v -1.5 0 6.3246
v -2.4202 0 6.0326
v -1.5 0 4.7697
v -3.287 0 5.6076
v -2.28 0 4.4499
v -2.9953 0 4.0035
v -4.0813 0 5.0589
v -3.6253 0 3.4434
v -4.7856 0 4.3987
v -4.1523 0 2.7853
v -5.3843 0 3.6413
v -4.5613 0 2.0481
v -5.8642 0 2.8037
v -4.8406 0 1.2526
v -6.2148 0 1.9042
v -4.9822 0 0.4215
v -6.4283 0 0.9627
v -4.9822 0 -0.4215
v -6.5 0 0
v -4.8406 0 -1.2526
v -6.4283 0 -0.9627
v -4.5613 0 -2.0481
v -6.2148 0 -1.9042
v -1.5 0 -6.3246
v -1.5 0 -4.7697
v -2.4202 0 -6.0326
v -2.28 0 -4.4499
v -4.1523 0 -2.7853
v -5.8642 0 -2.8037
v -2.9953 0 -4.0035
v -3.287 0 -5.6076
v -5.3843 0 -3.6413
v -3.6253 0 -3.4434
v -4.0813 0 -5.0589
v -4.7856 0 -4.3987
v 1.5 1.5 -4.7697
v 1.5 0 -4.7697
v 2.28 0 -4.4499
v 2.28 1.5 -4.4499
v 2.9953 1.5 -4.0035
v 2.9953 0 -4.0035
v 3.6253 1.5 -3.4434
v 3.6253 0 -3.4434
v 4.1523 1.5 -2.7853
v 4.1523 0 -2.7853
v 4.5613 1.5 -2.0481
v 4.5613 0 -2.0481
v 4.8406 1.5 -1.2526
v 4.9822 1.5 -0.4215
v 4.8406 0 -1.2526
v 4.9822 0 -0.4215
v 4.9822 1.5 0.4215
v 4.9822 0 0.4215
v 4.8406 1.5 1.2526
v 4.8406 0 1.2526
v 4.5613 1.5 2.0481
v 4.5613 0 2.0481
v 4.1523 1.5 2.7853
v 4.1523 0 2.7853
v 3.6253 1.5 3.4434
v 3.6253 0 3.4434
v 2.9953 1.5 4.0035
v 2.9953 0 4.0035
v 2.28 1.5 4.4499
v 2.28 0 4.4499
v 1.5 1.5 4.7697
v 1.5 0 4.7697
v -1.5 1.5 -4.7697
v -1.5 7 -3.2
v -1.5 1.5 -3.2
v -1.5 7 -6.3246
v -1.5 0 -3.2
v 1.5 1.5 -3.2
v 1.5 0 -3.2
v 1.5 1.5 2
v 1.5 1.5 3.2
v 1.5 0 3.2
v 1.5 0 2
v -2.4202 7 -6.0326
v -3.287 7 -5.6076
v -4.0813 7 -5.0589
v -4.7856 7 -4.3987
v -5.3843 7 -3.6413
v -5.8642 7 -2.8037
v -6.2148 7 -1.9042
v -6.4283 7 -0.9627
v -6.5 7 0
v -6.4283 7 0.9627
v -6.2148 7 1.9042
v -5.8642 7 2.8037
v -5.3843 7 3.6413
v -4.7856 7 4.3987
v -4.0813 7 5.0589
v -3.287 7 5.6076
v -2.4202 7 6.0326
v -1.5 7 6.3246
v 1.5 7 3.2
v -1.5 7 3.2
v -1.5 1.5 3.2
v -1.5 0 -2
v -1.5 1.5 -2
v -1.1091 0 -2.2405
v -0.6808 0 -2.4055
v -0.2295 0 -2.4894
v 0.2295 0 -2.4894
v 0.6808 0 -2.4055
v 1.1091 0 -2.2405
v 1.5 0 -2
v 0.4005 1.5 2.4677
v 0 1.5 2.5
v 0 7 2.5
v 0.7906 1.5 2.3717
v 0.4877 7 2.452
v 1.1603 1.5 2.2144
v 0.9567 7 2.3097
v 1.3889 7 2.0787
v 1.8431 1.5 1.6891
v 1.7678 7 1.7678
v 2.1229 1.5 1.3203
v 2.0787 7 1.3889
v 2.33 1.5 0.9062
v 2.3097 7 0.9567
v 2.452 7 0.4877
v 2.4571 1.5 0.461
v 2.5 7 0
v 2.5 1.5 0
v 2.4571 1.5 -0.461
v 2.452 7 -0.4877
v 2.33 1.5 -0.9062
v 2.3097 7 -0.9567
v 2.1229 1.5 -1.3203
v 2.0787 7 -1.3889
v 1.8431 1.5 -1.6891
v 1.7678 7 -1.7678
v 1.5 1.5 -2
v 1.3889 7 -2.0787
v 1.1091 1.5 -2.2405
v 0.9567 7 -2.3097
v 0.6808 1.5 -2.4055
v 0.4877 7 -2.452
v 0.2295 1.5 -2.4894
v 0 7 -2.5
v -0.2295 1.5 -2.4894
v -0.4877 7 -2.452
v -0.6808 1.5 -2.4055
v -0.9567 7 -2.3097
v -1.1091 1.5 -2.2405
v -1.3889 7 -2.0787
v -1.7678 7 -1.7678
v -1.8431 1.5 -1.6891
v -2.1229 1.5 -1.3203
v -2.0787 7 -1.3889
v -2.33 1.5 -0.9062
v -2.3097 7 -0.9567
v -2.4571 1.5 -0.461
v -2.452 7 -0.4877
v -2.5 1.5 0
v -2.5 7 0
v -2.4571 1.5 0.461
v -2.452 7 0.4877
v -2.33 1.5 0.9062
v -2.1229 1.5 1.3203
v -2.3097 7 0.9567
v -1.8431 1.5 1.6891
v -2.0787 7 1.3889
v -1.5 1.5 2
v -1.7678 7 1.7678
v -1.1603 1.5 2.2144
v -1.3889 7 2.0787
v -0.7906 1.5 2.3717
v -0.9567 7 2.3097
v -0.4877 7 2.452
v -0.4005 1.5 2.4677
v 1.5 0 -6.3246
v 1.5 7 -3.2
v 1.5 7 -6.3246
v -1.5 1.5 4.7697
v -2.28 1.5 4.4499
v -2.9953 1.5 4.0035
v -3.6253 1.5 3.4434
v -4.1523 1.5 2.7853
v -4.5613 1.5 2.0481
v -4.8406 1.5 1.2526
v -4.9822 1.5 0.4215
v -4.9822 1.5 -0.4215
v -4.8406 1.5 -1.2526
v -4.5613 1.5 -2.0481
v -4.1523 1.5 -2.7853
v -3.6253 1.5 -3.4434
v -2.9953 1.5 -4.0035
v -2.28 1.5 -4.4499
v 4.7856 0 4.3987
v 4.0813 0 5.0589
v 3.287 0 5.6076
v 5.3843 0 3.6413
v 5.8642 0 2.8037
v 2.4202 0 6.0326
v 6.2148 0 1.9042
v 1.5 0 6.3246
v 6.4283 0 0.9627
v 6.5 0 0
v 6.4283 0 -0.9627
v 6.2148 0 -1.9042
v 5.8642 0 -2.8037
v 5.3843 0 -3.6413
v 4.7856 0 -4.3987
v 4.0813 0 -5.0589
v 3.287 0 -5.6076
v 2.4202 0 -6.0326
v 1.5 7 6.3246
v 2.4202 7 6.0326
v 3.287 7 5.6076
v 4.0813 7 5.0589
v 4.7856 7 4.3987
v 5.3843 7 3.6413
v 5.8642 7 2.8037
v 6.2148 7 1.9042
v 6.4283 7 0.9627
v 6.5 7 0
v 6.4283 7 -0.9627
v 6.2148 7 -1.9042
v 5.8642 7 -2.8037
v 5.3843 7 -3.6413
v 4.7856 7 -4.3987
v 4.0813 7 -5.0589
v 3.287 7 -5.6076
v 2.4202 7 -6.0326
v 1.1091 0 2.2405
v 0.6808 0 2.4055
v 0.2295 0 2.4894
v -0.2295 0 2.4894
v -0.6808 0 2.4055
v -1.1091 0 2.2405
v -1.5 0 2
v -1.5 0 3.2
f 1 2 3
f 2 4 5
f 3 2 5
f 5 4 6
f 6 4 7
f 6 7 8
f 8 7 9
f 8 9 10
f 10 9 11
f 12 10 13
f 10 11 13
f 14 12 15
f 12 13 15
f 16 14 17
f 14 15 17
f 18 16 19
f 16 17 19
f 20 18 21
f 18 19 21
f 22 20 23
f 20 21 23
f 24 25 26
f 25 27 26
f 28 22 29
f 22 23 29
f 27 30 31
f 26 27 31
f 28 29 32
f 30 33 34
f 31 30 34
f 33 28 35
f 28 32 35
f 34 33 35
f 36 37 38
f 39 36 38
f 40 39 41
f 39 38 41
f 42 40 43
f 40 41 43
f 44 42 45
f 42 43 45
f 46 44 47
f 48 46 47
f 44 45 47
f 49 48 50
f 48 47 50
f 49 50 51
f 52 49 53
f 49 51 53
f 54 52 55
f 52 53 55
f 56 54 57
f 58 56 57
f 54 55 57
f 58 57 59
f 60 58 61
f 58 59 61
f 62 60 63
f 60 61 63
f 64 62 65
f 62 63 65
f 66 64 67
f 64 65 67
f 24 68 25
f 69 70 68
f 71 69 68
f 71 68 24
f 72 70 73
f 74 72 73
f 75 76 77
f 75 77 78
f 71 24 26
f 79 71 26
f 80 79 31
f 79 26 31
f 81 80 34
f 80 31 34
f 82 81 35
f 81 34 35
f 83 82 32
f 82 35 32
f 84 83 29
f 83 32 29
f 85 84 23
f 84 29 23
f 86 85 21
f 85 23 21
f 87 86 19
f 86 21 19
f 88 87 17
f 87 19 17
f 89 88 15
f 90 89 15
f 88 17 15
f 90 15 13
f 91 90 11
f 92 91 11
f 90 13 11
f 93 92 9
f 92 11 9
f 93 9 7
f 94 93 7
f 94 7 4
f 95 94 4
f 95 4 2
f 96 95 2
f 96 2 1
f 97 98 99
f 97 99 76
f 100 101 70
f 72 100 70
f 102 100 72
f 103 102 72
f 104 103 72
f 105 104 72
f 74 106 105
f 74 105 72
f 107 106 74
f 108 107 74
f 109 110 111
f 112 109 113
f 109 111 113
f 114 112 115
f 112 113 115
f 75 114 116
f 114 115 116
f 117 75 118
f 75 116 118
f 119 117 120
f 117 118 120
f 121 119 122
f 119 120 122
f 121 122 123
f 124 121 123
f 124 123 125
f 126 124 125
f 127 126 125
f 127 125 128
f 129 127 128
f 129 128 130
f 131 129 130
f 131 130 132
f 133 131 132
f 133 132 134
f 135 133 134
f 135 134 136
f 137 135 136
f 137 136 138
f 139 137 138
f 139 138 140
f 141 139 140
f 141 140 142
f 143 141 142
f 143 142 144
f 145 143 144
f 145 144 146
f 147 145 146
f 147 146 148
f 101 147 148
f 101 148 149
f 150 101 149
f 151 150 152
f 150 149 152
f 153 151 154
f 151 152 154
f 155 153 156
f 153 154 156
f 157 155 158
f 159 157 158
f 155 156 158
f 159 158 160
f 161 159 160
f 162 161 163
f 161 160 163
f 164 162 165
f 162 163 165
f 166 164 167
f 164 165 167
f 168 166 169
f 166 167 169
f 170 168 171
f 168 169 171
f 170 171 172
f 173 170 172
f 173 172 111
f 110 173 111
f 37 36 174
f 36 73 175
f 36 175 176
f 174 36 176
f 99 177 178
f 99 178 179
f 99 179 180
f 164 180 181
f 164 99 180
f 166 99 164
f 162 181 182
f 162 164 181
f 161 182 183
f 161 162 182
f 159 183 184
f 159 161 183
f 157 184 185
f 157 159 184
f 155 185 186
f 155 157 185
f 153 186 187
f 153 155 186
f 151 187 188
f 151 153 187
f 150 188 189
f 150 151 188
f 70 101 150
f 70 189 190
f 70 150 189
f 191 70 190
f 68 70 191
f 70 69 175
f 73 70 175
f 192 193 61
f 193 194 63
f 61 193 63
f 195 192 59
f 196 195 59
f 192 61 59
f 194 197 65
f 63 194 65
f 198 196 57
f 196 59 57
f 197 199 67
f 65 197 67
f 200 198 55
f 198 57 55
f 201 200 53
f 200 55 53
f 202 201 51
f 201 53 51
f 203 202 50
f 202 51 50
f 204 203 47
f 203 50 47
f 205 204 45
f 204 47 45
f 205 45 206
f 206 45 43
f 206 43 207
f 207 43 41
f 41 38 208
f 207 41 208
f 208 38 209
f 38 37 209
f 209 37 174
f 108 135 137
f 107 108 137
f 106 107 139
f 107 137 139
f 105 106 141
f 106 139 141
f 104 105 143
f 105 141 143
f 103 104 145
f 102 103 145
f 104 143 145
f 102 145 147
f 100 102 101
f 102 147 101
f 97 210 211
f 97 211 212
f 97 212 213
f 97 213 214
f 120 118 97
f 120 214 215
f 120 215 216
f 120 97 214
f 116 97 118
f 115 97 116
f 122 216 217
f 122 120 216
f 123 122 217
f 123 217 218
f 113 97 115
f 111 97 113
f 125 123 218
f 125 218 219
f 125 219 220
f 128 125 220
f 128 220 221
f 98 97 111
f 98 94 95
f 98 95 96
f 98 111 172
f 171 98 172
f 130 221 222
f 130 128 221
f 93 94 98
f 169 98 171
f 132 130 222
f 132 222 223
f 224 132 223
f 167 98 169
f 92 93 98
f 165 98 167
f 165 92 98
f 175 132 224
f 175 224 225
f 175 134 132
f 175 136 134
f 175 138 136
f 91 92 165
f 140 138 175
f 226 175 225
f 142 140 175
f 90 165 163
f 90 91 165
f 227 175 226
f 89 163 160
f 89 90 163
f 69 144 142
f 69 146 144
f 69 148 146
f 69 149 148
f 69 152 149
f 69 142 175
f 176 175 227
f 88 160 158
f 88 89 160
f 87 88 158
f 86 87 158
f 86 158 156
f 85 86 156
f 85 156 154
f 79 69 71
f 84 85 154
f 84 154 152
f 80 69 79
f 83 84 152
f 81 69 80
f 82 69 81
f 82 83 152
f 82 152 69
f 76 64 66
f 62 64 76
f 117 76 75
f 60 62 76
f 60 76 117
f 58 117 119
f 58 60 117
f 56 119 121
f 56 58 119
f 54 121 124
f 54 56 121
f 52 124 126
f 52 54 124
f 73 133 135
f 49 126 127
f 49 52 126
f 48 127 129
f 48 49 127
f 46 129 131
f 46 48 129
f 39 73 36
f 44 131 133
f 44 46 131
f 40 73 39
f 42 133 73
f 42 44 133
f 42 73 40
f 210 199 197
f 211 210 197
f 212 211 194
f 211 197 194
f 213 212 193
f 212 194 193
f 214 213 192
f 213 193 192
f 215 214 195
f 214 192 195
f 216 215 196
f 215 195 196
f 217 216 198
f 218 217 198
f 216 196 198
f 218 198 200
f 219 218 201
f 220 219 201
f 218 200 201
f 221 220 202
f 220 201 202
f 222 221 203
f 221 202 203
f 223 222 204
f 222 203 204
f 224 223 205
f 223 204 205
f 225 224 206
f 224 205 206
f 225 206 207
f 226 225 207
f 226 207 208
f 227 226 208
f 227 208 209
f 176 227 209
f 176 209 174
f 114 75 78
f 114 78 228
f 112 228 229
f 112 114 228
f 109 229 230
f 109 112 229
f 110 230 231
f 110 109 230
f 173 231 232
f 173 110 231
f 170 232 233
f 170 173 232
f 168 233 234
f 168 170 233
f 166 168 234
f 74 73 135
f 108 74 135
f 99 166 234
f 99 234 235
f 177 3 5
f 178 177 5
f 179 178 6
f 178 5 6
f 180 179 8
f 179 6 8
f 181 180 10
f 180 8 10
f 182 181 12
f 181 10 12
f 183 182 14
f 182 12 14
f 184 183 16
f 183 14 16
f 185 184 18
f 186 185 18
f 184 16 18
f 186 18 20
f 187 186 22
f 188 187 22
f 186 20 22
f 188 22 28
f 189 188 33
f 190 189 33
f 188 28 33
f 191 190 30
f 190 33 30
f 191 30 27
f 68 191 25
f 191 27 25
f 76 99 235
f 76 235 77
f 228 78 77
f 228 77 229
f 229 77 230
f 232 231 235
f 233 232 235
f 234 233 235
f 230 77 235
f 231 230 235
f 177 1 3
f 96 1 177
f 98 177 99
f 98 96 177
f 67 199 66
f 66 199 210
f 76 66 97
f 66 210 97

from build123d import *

# Parameters (mm, degrees)
SKETCH1_R           = 6.5
BOSS_EXTRUDE1_DEPTH = 7
SKETCH2_R           = 5
CUT_EXTRUDE1_DEPTH  = 1.5
SKETCH3_R           = 2.5
SKETCH3_W           = 3
SKETCH3_H           = 3.5
CUT_EXTRUDE2_DEPTH  = 12.554220008
BOSS_EXTRUDE2_DEPTH = 1.5


with BuildPart() as part:
    # Sketch1 → Boss-Extrude1 (new body)
    with BuildSketch(Plane(origin=(0, 0, 0), x_dir=(1, 0, 0), z_dir=(0, 1, 0))):
        Circle(SKETCH1_R)
    extrude(amount=BOSS_EXTRUDE1_DEPTH)

    # Sketch2 → Cut-Extrude1 (cut)
    with BuildSketch(Plane.XZ):
        Circle(SKETCH2_R)
    extrude(amount=-CUT_EXTRUDE1_DEPTH, mode=Mode.SUBTRACT)

    # Sketch3 → Cut-Extrude2 (cut, through all)
    with BuildSketch(Plane(origin=(0, 7, 0), x_dir=(1, 0, 0), z_dir=(0, 1, 0))):
        Circle(SKETCH3_R)
        with Locations((0, 4.95)):
            Rectangle(SKETCH3_W, SKETCH3_H)
        with Locations((0, -4.95)):
            Rectangle(SKETCH3_W, SKETCH3_H)
    extrude(amount=-CUT_EXTRUDE2_DEPTH, mode=Mode.SUBTRACT)

    # Sketch4 → Boss-Extrude2 (add)
    with BuildSketch(Plane.XZ.offset(-1.5)):
        with BuildLine():
            Line((-1.5, 2), (-1.5, 3.2))
            Line((-1.5, 3.2), (1.5, 3.2))
            Line((1.5, 3.2), (1.5, 2))
            ThreePointArc((1.5, 2), (0, 2.5), (-1.5, 2))
        make_face()
        with BuildLine():
            Line((-1.5, -2), (-1.5, -3.2))
            Line((-1.5, -3.2), (1.5, -3.2))
            Line((1.5, -3.2), (1.5, -2))
            ThreePointArc((1.5, -2), (0, -2.5), (-1.5, -2))
        make_face()
    extrude(amount=BOSS_EXTRUDE2_DEPTH)


solid = part.part
